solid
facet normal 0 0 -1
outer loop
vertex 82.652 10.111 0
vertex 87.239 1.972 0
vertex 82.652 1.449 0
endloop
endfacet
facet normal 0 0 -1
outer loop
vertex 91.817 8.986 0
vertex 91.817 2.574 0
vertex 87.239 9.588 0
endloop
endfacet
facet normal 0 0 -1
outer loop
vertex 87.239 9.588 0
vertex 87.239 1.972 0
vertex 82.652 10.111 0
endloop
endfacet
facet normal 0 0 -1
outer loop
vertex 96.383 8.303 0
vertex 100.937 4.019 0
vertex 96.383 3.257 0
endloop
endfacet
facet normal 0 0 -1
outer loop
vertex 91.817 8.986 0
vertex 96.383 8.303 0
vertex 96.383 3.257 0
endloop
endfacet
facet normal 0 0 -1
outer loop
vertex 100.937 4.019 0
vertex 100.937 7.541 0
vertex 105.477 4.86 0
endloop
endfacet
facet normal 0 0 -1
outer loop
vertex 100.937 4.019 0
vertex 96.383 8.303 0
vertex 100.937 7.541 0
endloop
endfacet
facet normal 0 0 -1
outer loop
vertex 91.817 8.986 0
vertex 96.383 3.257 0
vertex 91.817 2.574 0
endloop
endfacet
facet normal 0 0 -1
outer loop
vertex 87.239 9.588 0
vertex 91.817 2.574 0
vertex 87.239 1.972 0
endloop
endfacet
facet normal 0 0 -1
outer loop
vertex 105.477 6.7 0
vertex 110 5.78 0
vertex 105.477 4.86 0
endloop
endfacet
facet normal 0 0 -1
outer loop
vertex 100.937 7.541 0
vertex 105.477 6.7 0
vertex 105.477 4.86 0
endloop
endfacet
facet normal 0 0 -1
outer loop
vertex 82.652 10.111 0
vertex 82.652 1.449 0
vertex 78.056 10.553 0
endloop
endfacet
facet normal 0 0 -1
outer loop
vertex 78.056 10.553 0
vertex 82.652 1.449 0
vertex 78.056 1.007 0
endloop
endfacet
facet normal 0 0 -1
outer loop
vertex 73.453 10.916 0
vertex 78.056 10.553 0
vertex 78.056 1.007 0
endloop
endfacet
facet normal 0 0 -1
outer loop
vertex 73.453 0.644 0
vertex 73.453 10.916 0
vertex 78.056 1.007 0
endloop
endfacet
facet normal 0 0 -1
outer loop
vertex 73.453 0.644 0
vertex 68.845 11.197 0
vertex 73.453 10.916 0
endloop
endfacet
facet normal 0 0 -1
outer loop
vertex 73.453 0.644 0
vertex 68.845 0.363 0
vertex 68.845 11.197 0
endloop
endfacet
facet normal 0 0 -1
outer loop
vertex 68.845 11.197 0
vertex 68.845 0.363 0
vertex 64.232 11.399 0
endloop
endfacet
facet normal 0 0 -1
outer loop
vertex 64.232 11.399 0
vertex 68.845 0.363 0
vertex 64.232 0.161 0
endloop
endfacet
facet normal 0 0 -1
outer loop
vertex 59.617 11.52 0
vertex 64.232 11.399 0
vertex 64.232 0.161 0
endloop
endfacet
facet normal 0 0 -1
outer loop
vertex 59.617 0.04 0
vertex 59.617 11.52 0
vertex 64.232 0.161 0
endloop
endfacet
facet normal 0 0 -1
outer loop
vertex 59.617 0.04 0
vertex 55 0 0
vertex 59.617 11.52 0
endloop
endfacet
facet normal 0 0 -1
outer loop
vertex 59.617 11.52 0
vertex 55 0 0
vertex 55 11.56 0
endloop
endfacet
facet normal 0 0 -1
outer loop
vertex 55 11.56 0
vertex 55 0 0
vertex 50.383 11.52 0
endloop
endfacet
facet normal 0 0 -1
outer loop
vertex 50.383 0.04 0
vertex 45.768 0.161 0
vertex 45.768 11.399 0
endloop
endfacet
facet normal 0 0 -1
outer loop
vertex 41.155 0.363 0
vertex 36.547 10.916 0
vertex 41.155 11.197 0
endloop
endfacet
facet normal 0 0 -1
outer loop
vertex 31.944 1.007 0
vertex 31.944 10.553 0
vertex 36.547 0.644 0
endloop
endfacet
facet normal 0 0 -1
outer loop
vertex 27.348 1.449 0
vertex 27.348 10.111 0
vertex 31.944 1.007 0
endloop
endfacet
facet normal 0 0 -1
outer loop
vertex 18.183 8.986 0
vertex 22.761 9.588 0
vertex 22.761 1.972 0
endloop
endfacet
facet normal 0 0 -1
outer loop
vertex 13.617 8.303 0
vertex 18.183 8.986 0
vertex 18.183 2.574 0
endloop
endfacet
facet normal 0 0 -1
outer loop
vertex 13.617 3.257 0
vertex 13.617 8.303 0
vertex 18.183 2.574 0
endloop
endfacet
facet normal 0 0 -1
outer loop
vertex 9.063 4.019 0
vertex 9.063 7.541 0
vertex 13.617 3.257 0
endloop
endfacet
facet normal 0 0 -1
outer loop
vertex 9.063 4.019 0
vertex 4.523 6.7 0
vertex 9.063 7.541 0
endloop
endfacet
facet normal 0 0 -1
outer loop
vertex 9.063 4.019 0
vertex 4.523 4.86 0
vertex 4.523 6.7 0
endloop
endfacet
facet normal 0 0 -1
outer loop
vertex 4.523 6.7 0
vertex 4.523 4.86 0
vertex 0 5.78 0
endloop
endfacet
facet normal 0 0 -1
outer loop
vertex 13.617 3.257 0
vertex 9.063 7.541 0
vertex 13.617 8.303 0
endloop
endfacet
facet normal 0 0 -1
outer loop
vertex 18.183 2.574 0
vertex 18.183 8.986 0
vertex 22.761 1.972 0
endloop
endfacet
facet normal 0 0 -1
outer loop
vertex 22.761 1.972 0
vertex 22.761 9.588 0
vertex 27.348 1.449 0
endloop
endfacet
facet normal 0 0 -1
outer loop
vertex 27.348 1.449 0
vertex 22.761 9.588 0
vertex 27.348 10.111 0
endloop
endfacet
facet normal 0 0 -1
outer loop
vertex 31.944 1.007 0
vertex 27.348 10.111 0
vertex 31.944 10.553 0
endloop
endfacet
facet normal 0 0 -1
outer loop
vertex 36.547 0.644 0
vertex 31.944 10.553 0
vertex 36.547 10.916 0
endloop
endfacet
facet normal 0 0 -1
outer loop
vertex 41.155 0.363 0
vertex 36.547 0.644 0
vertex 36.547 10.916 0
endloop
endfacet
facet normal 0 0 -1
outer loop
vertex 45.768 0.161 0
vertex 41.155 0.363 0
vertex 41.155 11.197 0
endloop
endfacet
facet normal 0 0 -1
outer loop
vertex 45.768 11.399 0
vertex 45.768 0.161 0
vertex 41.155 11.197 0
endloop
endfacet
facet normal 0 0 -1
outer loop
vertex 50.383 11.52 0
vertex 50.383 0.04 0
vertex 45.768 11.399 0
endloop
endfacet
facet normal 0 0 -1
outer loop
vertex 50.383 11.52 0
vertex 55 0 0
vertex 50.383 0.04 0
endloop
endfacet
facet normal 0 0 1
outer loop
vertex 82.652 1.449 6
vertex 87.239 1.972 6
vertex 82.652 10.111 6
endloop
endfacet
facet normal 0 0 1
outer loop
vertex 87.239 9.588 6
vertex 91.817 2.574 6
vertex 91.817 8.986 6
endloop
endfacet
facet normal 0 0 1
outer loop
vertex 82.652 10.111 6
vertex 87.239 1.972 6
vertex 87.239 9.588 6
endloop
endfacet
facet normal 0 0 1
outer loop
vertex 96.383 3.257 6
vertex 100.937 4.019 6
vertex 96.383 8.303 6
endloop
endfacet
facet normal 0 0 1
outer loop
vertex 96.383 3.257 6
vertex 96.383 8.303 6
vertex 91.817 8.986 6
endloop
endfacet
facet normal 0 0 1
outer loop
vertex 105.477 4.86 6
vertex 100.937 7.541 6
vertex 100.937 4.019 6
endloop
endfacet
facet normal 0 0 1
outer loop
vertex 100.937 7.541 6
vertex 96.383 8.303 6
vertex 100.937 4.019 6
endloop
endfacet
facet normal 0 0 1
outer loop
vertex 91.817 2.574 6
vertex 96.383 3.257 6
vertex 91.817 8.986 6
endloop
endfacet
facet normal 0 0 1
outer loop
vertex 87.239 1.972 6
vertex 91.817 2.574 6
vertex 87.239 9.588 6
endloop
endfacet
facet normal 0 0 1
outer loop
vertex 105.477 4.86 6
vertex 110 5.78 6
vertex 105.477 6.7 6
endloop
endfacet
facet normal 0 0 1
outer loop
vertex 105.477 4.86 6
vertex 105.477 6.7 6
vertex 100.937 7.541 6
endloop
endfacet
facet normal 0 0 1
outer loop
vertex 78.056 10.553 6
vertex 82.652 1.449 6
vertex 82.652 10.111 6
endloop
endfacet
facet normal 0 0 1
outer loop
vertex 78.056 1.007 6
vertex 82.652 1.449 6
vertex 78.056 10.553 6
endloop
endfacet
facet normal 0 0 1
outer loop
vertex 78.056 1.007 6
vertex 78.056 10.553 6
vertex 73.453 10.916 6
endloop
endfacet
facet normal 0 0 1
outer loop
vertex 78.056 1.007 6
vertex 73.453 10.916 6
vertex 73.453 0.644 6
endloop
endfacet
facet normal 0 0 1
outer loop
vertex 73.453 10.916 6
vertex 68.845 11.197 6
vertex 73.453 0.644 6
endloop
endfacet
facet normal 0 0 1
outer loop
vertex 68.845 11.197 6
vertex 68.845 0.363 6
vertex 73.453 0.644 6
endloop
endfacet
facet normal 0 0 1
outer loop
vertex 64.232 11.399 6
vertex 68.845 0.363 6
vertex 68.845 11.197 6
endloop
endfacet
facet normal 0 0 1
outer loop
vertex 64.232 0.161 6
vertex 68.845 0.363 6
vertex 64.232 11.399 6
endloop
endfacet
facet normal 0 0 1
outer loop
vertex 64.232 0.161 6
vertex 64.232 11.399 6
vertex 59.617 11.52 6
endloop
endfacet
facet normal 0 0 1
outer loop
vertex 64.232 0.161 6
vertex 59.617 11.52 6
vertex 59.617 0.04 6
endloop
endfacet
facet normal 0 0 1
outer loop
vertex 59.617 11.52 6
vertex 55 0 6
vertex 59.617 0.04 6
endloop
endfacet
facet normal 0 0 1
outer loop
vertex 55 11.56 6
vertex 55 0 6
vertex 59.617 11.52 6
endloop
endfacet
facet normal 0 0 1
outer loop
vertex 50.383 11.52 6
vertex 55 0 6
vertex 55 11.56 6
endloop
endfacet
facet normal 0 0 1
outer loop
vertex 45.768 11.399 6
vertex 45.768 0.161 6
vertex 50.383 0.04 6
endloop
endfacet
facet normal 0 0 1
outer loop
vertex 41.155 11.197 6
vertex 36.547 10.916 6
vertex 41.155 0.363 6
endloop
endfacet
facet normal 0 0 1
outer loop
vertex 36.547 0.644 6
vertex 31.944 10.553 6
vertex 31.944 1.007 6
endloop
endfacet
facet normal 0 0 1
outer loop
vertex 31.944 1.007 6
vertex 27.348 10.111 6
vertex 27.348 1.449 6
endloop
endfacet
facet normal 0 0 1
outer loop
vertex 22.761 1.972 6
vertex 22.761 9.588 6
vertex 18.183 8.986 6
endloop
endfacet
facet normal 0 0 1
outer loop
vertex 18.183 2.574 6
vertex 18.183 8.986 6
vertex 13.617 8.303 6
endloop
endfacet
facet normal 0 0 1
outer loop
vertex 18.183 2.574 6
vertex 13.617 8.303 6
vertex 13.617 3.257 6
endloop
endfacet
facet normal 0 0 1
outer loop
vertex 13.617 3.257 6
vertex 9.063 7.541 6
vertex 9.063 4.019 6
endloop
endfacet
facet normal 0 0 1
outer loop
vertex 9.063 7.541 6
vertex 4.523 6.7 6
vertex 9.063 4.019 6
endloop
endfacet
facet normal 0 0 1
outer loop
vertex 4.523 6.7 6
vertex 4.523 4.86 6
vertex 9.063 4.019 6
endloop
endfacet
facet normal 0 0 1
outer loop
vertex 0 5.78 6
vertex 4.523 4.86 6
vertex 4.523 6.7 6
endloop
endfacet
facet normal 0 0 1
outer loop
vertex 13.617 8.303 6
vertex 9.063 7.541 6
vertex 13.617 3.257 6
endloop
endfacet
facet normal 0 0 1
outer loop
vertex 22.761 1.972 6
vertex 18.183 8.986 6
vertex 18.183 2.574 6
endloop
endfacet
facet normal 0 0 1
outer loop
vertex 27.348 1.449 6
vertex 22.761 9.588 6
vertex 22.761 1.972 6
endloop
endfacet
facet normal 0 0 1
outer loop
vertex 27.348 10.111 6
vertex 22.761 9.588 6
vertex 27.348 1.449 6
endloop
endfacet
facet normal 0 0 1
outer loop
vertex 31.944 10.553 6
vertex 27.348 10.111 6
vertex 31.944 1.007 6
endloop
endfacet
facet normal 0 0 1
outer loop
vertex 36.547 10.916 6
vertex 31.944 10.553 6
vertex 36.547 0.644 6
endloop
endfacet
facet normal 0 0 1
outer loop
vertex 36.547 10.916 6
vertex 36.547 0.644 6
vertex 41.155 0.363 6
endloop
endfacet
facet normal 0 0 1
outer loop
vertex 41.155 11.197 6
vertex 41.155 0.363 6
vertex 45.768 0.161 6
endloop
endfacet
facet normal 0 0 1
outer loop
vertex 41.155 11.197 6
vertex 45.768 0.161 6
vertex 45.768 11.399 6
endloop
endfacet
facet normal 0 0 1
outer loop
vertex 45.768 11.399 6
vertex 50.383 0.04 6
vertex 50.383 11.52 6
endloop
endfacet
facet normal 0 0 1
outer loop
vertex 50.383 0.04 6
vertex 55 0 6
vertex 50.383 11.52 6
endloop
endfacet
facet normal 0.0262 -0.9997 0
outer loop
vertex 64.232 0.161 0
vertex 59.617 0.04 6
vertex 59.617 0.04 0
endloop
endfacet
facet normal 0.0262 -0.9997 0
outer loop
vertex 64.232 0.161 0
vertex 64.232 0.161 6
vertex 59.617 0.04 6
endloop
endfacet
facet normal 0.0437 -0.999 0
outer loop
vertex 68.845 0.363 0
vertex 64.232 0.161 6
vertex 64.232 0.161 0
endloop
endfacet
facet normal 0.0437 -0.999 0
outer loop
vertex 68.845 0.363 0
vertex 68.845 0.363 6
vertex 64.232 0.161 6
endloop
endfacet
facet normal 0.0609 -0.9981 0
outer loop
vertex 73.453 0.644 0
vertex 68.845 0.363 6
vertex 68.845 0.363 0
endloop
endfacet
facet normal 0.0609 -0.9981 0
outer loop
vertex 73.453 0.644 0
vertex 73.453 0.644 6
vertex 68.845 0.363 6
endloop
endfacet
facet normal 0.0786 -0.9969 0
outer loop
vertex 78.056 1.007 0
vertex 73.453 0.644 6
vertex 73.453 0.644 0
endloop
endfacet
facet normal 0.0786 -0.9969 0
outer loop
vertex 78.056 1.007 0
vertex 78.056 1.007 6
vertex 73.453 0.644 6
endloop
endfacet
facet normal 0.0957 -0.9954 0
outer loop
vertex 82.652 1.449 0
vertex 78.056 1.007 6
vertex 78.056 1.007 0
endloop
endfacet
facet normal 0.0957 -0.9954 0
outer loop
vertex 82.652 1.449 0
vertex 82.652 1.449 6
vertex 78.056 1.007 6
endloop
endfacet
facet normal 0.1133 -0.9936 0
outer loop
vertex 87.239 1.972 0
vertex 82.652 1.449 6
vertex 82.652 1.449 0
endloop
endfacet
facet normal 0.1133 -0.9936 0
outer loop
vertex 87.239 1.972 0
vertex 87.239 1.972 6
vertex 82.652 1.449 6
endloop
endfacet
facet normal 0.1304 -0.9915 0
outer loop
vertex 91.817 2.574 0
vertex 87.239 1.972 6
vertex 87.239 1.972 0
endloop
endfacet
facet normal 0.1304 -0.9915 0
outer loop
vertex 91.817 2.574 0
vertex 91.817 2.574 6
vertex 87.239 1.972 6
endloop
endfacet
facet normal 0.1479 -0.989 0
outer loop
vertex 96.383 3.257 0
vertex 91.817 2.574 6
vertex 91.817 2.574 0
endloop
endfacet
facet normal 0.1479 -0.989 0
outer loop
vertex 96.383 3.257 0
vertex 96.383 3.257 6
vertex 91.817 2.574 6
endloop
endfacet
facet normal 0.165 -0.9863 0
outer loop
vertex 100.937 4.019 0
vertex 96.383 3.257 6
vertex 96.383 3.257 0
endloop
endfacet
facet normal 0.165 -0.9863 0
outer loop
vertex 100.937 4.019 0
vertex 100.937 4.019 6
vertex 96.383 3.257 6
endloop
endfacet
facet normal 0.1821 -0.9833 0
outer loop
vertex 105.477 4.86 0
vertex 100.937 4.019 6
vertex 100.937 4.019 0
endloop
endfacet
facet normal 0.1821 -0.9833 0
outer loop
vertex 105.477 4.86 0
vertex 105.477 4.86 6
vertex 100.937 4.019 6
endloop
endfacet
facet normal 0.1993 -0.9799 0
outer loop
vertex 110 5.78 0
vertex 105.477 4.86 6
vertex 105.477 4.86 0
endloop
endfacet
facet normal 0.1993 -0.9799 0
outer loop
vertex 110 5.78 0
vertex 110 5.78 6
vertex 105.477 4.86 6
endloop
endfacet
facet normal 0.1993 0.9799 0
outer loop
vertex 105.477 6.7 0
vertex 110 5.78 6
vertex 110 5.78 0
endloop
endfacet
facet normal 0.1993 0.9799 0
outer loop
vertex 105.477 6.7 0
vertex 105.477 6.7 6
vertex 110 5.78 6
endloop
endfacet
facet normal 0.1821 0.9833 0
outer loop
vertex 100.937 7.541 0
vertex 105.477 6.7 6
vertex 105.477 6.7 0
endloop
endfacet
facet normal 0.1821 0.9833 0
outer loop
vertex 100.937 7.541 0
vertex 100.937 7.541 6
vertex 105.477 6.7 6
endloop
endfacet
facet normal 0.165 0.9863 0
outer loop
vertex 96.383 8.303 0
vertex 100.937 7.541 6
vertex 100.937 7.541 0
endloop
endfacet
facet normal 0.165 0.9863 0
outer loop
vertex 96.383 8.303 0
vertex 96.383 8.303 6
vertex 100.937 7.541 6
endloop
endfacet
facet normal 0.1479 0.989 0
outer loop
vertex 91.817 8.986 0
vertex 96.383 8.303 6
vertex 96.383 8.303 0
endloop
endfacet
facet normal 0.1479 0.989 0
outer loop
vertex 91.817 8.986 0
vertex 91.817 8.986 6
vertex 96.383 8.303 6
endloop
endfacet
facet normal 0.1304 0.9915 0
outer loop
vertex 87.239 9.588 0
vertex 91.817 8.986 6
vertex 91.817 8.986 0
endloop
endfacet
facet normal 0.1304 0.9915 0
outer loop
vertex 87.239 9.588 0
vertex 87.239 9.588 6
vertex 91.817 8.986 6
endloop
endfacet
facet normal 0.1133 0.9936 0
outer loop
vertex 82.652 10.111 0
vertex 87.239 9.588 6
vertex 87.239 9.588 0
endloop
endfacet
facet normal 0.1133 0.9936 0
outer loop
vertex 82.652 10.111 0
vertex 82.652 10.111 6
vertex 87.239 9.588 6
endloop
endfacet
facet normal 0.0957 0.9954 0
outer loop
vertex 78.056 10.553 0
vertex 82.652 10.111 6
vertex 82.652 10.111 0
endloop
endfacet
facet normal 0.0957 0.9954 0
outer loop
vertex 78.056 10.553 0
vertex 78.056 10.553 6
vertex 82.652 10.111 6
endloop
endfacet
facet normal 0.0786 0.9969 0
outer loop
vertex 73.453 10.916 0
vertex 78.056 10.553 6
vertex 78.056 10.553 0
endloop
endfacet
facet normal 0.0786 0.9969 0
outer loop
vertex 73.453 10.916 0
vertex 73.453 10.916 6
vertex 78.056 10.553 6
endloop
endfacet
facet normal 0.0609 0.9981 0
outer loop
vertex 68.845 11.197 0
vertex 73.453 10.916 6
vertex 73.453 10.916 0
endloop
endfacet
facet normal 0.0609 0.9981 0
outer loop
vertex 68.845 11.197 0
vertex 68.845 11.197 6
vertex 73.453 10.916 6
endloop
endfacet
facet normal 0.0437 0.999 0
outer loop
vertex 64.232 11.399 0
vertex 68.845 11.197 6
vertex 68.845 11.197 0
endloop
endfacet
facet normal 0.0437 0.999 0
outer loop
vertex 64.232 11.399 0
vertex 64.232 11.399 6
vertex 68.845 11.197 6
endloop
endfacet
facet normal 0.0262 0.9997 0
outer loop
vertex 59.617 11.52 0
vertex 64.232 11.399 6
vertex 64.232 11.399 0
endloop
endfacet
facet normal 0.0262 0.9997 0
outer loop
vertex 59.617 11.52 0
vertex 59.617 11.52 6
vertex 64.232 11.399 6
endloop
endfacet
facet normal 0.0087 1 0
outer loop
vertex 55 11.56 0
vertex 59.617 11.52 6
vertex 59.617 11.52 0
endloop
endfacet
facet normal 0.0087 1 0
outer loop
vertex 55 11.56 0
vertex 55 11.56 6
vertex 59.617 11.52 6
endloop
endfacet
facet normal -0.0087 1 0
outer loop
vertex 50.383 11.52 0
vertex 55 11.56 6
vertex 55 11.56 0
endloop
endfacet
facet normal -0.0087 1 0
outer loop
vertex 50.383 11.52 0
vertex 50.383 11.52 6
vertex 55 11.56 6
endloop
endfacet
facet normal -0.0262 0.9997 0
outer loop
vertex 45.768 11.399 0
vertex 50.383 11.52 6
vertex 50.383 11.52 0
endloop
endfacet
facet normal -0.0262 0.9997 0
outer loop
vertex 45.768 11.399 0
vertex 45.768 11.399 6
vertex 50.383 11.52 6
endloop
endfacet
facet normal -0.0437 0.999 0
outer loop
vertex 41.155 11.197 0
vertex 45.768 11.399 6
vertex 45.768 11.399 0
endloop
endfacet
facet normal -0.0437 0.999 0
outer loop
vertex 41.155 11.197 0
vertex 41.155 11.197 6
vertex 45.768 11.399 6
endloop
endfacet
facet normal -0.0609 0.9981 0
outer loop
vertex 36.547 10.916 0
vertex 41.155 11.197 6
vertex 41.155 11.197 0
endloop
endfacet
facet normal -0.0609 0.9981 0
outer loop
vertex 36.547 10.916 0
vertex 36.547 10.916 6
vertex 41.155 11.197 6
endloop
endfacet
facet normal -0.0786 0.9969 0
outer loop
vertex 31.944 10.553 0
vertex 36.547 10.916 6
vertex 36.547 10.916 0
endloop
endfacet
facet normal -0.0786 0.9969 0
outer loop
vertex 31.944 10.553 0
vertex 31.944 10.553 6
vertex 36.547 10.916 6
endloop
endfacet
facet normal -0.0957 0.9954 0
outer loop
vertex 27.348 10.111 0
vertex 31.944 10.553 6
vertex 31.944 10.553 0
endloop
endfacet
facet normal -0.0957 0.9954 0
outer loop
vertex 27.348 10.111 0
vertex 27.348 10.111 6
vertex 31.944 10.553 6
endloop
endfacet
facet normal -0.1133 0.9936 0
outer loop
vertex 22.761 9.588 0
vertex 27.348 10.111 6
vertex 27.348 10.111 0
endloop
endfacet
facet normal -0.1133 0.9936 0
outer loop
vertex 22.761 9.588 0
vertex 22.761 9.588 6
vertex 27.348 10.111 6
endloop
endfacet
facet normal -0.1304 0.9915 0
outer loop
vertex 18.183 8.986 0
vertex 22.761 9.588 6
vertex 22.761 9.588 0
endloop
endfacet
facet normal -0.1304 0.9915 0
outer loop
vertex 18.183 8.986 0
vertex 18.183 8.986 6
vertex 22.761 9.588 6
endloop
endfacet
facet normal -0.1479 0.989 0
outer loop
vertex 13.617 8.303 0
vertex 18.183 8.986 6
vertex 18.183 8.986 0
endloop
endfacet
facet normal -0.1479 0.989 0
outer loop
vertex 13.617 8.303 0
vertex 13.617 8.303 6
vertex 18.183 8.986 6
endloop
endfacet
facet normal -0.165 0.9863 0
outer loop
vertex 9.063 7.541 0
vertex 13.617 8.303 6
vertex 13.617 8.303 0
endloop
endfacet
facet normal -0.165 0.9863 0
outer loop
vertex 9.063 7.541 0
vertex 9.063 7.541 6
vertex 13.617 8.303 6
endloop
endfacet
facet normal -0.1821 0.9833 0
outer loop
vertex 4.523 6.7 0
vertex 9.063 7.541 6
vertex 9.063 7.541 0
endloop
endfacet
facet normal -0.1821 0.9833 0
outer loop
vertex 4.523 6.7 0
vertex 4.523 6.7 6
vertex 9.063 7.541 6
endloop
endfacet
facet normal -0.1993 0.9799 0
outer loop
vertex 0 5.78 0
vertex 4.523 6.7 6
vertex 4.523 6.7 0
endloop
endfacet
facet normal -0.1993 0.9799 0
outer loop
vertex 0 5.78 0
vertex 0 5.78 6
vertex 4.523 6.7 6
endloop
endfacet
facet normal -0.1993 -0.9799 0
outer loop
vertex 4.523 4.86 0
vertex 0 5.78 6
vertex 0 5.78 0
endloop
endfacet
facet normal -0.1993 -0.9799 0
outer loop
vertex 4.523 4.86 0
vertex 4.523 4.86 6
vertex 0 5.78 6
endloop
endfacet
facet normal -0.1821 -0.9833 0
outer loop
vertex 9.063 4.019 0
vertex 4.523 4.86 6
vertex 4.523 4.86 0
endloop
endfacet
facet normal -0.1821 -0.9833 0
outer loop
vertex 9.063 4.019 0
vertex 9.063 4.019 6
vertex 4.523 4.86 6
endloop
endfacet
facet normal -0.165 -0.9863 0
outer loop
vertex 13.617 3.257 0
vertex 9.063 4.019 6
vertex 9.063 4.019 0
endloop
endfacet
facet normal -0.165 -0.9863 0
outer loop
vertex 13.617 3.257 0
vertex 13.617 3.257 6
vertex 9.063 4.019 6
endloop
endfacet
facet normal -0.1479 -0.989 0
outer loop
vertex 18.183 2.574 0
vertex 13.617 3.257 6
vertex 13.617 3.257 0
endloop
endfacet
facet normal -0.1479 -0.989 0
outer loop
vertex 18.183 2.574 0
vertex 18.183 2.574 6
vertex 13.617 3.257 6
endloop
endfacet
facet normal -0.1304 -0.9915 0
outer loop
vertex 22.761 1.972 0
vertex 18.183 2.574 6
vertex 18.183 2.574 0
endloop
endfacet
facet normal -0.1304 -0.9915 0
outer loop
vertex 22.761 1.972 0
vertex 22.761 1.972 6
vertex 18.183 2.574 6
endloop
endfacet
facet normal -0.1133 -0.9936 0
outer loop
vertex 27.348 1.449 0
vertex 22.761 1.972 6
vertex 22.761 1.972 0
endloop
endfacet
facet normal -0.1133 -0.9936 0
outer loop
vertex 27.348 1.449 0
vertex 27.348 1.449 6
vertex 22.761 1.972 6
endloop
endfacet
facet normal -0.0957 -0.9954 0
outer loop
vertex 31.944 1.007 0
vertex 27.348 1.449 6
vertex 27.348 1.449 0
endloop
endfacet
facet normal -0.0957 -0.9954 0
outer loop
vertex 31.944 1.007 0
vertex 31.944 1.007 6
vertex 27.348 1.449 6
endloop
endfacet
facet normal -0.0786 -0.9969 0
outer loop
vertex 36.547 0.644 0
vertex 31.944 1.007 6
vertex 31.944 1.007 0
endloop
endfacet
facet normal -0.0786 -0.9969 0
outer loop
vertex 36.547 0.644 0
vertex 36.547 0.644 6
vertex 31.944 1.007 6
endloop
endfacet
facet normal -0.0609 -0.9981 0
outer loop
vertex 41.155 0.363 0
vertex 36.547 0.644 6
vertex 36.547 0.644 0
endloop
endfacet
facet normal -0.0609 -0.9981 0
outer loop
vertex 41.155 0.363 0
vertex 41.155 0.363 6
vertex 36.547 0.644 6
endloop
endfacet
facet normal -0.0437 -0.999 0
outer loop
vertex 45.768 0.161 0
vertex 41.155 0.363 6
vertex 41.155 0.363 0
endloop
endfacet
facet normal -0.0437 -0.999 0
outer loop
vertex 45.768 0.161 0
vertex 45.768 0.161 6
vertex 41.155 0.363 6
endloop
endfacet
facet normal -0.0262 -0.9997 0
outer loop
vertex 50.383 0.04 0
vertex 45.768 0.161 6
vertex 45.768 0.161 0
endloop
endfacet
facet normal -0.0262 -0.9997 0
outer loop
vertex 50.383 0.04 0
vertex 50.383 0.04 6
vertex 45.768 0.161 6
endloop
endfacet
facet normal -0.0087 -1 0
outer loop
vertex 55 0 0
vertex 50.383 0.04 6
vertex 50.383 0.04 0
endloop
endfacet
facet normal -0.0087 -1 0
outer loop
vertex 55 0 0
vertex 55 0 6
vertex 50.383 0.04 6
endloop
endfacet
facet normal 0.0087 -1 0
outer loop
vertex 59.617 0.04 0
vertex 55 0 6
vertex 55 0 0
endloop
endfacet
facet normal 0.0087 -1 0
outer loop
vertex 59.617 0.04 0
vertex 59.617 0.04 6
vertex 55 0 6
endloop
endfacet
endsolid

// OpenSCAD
$fn = 32;

// ----------------------------------------------------------------------
// Arc profile plate: lens, 48 points
// ----------------------------------------------------------------------

// --- parameters (mm) ---
lens_chord = 110;         // chord length of the lens, X
arc_r = 264.54;           // radius of both arcs
arc_angle = 24;           // angle of each arc, degrees
sagitta = 5.78;           // bulge of each arc (half the lens height)
arc_step = 1;             // sampling step of the arcs, degrees
plate_t = 6;              // plate thickness, Z
fit_tol = 0.05;           // declared fit tolerance (prompt contract)
free_tol = 0.3;           // declared free tolerance (prompt contract)

bbox_y = 2 * sagitta;  // full lens height

profile = [[110, 5.78], [105.477, 6.7], [100.937, 7.541], [96.383, 8.303], [91.817, 8.986], [87.239, 9.588], [82.652, 10.111], [78.056, 10.553], [73.453, 10.916], [68.845, 11.197], [64.232, 11.399], [59.617, 11.52], [55, 11.56], [50.383, 11.52], [45.768, 11.399], [41.155, 11.197], [36.547, 10.916], [31.944, 10.553], [27.348, 10.111], [22.761, 9.588], [18.183, 8.986], [13.617, 8.303], [9.063, 7.541], [4.523, 6.7], [0, 5.78], [4.523, 4.86], [9.063, 4.019], [13.617, 3.257], [18.183, 2.574], [22.761, 1.972], [27.348, 1.449], [31.944, 1.007], [36.547, 0.644], [41.155, 0.363], [45.768, 0.161], [50.383, 0.04], [55, 0], [59.617, 0.04], [64.232, 0.161], [68.845, 0.363], [73.453, 0.644], [78.056, 1.007], [82.652, 1.449], [87.239, 1.972], [91.817, 2.574], [96.383, 3.257], [100.937, 4.019], [105.477, 4.86]];  // primary outline, 48 points, counter clockwise

// --- the one profile operation ---
linear_extrude(height = plate_t) polygon(points = profile);
